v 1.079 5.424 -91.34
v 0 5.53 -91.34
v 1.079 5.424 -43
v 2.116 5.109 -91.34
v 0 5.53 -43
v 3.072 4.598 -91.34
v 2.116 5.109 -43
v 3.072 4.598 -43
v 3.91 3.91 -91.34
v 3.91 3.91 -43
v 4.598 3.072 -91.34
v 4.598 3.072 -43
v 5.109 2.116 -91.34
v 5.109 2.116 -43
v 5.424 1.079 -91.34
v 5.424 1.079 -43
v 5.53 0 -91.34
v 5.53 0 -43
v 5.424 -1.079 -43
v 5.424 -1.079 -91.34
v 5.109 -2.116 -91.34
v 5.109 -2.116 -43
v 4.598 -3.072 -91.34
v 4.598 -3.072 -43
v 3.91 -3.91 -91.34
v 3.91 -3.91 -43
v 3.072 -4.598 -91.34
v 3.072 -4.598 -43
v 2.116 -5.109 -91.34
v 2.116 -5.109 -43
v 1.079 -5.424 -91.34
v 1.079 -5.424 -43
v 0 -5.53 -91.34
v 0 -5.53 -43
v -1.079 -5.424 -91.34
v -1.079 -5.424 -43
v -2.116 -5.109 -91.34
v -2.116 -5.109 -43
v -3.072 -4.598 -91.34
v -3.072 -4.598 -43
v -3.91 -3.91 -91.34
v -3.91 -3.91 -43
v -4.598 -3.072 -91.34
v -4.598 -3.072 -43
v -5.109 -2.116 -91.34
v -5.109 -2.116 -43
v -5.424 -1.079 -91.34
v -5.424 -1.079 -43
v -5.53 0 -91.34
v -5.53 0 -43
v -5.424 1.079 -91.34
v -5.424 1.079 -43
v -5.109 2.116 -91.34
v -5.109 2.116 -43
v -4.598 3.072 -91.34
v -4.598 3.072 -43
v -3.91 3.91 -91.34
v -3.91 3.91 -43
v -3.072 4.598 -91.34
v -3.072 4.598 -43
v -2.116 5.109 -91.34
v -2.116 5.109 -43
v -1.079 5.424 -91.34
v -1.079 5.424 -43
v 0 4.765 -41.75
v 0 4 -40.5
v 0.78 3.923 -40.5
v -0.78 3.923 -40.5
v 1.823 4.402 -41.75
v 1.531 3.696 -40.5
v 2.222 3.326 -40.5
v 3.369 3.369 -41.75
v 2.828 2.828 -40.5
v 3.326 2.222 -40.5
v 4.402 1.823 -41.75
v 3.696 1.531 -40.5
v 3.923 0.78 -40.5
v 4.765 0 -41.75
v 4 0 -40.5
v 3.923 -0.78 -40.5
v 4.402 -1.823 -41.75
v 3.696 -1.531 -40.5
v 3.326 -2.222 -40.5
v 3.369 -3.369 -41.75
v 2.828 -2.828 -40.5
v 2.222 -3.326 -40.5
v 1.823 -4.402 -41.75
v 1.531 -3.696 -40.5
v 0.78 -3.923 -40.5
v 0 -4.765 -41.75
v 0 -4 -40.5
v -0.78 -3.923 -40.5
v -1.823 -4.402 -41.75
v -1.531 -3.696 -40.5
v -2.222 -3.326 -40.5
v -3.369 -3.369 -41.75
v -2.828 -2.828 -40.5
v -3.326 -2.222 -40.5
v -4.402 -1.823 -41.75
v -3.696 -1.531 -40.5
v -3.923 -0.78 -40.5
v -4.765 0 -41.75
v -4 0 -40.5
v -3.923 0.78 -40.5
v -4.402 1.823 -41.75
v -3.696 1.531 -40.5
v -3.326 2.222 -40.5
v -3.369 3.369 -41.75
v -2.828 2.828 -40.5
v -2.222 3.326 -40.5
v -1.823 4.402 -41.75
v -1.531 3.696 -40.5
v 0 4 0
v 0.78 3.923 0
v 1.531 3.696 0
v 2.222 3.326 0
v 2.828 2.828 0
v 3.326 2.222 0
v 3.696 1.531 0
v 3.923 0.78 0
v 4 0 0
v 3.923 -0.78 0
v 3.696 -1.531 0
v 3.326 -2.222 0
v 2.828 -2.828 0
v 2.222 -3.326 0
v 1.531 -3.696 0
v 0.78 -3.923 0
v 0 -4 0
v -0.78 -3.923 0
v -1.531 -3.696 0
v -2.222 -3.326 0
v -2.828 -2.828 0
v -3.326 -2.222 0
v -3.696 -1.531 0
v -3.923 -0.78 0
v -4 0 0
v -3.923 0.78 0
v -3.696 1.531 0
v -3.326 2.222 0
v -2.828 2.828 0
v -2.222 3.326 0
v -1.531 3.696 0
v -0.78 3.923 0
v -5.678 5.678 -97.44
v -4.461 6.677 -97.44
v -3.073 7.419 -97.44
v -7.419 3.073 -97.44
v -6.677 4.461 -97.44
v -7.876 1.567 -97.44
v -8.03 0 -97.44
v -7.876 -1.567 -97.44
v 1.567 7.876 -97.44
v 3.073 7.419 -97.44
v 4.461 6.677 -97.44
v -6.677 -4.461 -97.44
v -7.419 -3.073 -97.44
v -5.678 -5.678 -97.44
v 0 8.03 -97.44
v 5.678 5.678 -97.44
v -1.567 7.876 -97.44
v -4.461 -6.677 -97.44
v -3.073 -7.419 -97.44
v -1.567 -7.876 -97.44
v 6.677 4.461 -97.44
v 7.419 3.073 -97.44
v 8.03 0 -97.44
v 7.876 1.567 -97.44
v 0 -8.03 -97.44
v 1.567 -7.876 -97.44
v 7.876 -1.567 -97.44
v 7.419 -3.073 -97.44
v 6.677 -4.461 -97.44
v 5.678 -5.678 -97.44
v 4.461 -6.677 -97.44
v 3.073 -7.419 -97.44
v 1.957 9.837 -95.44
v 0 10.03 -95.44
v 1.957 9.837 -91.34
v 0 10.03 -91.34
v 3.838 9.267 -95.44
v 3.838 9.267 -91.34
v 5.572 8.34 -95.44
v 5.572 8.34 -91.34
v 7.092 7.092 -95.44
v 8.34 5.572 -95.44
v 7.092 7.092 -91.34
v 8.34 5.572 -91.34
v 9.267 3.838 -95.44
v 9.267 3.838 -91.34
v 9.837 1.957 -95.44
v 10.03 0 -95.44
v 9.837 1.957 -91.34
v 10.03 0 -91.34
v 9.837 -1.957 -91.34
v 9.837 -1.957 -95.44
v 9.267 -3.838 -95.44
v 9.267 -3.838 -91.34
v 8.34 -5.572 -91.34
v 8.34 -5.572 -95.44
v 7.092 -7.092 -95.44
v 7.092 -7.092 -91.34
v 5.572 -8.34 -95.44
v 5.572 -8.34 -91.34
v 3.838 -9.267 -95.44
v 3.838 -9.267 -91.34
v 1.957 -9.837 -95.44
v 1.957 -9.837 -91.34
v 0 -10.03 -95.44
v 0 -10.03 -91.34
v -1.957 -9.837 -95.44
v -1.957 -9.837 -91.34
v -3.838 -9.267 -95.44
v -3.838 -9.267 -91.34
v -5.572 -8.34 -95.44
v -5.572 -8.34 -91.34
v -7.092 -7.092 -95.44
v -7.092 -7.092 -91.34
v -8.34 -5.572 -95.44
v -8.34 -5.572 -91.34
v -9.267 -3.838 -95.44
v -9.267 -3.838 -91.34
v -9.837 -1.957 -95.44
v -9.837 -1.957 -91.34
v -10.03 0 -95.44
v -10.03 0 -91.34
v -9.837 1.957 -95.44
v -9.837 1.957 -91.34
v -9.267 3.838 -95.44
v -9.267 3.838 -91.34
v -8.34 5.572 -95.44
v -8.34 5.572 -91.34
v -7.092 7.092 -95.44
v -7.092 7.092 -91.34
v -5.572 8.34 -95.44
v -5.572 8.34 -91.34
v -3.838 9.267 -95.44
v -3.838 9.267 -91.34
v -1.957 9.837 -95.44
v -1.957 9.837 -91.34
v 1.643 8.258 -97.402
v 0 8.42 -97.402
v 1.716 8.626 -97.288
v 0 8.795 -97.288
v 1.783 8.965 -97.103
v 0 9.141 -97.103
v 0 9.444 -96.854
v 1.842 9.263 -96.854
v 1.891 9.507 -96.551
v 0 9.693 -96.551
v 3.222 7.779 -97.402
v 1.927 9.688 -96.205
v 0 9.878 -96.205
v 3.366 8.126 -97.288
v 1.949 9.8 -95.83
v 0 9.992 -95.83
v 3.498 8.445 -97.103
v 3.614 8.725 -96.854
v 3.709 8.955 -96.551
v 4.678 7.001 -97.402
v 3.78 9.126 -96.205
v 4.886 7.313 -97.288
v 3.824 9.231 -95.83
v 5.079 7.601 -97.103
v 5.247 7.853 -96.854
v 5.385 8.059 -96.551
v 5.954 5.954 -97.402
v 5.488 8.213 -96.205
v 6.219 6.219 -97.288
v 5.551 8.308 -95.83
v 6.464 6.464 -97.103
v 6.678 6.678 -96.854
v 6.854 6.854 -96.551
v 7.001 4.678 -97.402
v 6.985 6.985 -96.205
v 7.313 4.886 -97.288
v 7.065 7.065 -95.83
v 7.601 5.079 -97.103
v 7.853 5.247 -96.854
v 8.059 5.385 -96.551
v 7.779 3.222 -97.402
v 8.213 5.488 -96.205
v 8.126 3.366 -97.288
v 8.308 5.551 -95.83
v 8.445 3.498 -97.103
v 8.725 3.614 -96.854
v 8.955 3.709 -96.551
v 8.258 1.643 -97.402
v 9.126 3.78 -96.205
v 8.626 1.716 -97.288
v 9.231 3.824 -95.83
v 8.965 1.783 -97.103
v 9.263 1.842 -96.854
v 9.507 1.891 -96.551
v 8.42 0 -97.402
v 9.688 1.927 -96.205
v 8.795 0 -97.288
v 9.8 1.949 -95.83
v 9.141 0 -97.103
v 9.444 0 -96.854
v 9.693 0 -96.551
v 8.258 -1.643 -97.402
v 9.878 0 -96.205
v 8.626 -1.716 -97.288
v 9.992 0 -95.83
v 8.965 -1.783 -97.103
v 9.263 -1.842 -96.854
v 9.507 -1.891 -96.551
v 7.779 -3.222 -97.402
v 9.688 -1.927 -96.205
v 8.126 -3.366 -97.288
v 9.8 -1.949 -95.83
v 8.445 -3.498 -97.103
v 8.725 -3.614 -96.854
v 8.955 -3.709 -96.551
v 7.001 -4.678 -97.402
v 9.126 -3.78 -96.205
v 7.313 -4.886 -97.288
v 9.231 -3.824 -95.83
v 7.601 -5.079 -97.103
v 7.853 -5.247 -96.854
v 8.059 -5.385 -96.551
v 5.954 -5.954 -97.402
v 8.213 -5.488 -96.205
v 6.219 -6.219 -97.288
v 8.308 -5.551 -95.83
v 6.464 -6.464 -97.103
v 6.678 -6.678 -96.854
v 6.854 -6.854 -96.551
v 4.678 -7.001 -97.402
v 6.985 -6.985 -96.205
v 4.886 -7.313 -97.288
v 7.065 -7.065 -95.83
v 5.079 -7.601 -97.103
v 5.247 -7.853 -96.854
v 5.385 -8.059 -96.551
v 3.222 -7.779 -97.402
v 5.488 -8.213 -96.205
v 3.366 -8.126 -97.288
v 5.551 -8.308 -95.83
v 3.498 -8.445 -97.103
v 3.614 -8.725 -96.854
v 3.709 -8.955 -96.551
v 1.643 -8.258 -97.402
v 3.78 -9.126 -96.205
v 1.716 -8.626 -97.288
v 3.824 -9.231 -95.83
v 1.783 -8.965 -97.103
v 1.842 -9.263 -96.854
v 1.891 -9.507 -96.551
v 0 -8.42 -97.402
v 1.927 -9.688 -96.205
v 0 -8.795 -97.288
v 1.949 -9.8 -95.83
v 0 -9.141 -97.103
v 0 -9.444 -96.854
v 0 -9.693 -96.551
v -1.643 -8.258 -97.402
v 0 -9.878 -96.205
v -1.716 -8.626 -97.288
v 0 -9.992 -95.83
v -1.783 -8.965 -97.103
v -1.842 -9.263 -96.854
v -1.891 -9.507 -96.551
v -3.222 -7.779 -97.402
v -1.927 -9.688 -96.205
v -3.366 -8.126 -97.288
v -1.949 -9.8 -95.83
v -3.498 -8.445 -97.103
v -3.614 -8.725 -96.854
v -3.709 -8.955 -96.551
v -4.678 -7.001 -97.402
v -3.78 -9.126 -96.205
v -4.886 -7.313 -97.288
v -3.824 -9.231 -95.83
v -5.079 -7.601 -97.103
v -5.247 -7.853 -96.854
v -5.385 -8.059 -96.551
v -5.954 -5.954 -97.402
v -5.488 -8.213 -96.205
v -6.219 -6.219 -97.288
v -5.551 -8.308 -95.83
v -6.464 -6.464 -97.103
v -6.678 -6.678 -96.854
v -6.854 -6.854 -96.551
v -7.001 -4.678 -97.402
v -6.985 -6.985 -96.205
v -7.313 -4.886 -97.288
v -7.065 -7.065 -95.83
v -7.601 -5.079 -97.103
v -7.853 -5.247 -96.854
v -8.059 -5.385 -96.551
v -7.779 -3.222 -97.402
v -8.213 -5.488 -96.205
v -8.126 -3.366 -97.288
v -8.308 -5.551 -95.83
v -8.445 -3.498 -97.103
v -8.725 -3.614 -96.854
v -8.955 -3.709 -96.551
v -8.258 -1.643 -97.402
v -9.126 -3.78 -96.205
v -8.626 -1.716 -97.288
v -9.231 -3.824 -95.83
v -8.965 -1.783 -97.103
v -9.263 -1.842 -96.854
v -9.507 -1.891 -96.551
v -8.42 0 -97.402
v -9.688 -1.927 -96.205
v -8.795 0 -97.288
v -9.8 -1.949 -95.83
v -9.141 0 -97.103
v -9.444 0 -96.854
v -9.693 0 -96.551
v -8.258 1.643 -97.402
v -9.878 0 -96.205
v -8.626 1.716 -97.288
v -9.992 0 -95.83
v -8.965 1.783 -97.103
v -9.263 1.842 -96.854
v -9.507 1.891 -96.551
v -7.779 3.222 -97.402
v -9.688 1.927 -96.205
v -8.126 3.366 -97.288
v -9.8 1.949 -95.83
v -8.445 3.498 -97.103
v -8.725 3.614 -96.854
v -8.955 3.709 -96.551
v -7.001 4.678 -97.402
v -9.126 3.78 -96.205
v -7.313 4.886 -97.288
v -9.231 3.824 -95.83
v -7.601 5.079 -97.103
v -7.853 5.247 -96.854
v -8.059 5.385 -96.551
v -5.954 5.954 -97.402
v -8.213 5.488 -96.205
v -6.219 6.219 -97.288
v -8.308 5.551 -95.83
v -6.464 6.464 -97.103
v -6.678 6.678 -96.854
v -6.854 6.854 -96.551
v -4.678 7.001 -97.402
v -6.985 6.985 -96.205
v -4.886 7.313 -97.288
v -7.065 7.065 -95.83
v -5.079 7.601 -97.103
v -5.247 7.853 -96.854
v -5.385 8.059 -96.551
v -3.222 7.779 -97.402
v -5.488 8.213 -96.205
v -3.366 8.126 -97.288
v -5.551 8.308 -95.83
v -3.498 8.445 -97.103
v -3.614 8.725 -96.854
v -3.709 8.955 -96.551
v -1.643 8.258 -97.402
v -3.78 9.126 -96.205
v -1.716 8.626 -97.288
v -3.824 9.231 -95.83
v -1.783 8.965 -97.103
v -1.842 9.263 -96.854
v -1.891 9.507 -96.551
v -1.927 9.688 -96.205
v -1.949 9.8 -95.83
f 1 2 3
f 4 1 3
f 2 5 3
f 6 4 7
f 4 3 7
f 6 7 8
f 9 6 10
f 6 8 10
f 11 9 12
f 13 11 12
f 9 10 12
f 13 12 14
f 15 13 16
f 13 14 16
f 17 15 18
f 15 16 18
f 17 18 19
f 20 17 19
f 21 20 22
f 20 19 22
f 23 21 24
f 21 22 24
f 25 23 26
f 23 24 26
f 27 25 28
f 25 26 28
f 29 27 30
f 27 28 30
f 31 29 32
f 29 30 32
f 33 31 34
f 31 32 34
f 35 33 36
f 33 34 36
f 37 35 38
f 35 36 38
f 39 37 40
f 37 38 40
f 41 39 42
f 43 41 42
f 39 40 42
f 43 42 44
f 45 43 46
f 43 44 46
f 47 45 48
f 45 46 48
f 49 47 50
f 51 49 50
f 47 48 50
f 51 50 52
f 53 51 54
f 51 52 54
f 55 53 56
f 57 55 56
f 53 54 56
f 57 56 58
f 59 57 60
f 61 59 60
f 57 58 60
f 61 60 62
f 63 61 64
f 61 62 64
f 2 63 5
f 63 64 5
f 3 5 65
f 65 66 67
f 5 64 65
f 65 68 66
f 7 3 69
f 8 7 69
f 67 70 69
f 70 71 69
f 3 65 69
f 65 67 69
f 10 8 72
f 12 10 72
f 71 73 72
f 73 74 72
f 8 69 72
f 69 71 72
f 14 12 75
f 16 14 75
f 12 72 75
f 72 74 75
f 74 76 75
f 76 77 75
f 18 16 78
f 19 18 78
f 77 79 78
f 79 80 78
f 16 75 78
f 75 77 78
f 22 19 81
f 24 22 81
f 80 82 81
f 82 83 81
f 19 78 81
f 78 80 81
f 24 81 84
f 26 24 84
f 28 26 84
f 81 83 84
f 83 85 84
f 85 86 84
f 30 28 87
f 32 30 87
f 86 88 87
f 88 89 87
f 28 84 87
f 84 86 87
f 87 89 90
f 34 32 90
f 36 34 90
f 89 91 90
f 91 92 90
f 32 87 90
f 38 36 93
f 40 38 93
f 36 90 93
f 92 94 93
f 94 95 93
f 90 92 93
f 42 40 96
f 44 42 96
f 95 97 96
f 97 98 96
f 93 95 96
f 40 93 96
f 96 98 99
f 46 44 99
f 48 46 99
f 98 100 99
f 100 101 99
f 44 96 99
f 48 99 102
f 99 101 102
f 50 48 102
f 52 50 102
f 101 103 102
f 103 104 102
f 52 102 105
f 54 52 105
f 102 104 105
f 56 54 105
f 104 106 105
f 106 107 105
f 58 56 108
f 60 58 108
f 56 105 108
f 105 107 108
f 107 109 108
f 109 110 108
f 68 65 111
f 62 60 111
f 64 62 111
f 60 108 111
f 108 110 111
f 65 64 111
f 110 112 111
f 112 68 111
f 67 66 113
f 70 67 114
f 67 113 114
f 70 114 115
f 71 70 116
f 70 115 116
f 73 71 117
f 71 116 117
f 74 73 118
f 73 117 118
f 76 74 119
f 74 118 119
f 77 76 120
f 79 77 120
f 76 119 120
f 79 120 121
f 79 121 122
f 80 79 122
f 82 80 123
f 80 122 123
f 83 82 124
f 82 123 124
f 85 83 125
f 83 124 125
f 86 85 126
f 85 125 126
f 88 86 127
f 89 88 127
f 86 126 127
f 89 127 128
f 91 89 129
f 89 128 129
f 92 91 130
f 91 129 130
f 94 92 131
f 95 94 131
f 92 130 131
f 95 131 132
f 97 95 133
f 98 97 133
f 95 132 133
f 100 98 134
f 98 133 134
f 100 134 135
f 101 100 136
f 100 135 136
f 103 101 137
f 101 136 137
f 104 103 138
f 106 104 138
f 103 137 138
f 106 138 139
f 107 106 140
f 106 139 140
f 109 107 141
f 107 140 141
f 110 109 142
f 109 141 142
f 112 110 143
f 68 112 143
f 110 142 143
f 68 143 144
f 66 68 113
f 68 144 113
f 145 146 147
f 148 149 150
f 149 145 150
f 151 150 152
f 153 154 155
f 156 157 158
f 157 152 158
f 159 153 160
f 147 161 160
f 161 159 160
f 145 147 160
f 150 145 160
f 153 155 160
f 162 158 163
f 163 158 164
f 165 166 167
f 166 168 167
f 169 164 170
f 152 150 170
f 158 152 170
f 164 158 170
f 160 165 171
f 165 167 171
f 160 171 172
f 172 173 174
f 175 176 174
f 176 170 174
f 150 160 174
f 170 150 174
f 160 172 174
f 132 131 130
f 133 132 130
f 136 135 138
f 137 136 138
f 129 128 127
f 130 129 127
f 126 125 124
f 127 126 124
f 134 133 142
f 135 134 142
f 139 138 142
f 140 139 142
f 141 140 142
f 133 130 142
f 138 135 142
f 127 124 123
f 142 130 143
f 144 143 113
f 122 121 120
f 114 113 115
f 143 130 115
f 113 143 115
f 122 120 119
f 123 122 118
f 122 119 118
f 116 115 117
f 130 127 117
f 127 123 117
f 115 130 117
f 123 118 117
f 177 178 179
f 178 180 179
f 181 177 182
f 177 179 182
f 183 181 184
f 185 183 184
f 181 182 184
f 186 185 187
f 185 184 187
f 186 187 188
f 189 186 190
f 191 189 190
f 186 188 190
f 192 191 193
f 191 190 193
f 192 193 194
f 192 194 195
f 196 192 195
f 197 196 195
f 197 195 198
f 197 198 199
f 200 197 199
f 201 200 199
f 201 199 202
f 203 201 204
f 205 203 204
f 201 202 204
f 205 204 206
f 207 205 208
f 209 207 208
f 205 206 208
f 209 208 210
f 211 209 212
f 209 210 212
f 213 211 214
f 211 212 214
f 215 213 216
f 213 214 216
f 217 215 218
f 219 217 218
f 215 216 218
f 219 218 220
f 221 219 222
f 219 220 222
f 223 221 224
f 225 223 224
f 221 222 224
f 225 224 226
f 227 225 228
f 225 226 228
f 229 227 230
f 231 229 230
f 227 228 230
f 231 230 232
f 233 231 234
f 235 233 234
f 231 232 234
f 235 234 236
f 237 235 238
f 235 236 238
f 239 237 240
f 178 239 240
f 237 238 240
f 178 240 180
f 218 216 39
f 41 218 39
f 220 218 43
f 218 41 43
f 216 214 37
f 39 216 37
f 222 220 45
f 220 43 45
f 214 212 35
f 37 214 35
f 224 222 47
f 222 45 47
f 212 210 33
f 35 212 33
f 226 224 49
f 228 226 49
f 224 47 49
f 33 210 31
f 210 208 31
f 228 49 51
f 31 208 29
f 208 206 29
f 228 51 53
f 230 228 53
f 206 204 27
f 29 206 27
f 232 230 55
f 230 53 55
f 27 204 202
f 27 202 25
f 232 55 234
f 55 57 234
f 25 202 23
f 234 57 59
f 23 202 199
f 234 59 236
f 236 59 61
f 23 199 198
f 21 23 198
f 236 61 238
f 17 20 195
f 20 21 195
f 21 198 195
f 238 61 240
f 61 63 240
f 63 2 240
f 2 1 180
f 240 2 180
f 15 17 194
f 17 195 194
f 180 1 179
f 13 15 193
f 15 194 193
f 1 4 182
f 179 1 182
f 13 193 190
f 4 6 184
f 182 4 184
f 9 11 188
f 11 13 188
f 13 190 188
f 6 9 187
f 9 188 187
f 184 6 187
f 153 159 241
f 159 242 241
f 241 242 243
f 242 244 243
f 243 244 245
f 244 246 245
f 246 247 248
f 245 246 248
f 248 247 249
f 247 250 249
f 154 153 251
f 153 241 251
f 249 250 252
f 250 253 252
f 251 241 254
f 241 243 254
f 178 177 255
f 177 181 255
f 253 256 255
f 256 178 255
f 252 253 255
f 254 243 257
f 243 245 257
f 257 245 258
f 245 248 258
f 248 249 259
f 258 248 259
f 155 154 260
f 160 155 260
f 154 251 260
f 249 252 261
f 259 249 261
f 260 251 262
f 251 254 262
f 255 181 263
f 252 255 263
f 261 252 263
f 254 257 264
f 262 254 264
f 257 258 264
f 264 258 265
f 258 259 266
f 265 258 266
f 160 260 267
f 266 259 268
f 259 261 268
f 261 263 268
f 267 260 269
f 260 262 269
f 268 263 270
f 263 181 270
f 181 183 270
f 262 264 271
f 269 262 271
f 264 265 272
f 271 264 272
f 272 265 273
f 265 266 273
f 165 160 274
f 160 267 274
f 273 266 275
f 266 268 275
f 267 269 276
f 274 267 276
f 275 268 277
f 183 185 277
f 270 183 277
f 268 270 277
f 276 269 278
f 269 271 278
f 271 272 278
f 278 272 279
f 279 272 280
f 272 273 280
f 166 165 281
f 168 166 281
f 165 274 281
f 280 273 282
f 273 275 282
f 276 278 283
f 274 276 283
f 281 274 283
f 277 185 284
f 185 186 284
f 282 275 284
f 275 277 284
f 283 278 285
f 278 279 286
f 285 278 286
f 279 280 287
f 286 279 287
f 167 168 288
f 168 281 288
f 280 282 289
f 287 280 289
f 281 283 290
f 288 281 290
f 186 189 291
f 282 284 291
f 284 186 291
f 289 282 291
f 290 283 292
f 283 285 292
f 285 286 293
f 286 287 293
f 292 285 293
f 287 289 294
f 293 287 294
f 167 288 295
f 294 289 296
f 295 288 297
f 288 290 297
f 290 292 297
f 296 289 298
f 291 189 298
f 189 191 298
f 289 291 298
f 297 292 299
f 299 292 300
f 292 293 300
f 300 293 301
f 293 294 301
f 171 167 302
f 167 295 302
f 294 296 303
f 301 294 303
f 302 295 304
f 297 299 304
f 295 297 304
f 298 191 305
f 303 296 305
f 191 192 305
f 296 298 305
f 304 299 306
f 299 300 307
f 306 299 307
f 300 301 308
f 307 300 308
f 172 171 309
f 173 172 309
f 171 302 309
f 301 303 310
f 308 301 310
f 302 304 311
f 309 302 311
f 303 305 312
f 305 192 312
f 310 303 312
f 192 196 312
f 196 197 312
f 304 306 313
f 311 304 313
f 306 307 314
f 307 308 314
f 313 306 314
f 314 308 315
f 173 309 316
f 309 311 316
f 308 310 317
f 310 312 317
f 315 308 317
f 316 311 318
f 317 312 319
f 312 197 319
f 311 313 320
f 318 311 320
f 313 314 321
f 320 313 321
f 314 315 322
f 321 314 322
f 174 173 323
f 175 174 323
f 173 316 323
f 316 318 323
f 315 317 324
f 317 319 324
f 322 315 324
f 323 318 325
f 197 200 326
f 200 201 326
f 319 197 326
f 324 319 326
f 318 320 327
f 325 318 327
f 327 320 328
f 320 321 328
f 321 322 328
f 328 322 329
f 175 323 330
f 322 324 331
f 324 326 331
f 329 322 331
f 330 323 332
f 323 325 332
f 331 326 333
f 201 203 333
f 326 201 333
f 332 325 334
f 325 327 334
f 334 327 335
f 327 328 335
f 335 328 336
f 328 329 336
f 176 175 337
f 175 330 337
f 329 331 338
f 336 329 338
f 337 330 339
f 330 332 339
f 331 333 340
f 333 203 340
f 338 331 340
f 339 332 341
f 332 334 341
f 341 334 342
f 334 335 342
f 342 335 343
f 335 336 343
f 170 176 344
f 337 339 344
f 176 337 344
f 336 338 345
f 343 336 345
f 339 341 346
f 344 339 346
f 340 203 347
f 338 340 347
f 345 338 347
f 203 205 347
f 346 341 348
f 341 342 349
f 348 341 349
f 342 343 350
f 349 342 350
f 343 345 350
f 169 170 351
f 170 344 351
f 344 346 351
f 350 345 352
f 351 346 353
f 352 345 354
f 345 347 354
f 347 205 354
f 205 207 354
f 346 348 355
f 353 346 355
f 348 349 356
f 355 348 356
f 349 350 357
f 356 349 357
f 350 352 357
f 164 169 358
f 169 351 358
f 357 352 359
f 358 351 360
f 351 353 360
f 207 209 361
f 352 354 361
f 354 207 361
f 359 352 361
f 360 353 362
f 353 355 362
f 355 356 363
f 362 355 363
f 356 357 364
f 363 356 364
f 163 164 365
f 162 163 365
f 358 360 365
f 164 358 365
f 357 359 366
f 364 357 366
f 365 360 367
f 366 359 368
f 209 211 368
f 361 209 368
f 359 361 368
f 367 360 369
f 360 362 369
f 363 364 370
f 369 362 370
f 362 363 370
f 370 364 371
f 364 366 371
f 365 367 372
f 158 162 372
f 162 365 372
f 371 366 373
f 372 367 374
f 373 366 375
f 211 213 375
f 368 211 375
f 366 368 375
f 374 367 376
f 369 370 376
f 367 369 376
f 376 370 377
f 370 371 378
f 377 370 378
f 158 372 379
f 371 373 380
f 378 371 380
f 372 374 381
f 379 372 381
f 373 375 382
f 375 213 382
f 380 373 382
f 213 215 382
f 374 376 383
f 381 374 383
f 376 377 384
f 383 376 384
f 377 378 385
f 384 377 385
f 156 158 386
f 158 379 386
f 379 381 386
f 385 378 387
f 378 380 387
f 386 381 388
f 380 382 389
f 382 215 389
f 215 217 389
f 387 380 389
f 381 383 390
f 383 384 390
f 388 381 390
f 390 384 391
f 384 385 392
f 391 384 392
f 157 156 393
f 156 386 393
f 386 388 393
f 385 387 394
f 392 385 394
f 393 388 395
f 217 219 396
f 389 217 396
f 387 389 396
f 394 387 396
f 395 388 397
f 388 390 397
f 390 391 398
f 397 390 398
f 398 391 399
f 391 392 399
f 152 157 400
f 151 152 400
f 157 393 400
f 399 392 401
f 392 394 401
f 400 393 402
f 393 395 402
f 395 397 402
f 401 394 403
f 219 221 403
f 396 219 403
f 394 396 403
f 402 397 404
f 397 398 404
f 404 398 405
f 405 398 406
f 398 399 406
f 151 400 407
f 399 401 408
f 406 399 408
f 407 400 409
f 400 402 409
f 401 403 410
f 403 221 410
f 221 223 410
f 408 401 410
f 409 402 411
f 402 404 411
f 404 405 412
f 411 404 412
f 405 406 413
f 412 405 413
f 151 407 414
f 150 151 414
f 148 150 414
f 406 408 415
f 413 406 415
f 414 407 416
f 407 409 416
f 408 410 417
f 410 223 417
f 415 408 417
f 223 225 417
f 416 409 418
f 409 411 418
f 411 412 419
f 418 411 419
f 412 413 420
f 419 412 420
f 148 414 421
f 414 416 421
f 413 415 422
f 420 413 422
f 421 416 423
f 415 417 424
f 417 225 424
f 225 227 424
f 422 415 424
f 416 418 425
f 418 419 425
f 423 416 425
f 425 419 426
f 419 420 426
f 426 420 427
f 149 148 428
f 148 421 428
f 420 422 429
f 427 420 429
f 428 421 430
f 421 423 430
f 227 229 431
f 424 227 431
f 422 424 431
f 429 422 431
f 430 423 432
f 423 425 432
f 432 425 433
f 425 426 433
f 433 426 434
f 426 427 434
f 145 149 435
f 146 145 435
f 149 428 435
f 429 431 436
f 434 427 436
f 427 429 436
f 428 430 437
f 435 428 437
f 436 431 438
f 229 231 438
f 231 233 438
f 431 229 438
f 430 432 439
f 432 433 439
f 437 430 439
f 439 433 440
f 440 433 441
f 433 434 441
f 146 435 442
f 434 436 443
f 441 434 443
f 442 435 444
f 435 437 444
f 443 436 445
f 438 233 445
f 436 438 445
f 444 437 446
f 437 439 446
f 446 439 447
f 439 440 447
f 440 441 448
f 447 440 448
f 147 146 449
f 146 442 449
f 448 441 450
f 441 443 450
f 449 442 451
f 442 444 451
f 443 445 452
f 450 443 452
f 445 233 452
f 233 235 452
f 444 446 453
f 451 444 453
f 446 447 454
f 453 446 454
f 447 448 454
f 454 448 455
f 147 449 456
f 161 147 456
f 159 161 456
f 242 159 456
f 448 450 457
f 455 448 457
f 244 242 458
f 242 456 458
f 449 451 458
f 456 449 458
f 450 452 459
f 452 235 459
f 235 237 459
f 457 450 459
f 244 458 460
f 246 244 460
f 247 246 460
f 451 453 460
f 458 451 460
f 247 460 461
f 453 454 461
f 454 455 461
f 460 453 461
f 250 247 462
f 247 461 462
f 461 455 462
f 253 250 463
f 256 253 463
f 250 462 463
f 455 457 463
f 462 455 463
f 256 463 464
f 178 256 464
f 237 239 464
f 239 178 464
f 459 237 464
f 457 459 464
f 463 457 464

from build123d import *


with BuildPart() as part:
    # Esquisse1 → Révolution1 (revolve)
    with BuildSketch(Plane(origin=(0, 0, 0), x_dir=(0, 0, -1), z_dir=(1, 0, 0))):
        with BuildLine():
            Line((97.44, 0), (97.44, 8.03))
            ThreePointArc((97.44, 8.03), (96.854213562, 9.444213562), (95.44, 10.03))
            Line((95.44, 10.03), (91.34, 10.03))
            Line((91.34, 10.03), (91.34, 5.53))
            Line((91.34, 5.53), (43, 5.53))
            Line((43, 5.53), (40.5, 4))
            Line((40.5, 4), (0, 4))
            Line((0, 4), (0, 0))
            Line((0, 0), (97.44, 0))
        make_face()
    revolve(axis=Axis((0, 0, 0), (0, 0, -1)))


solid = part.part
